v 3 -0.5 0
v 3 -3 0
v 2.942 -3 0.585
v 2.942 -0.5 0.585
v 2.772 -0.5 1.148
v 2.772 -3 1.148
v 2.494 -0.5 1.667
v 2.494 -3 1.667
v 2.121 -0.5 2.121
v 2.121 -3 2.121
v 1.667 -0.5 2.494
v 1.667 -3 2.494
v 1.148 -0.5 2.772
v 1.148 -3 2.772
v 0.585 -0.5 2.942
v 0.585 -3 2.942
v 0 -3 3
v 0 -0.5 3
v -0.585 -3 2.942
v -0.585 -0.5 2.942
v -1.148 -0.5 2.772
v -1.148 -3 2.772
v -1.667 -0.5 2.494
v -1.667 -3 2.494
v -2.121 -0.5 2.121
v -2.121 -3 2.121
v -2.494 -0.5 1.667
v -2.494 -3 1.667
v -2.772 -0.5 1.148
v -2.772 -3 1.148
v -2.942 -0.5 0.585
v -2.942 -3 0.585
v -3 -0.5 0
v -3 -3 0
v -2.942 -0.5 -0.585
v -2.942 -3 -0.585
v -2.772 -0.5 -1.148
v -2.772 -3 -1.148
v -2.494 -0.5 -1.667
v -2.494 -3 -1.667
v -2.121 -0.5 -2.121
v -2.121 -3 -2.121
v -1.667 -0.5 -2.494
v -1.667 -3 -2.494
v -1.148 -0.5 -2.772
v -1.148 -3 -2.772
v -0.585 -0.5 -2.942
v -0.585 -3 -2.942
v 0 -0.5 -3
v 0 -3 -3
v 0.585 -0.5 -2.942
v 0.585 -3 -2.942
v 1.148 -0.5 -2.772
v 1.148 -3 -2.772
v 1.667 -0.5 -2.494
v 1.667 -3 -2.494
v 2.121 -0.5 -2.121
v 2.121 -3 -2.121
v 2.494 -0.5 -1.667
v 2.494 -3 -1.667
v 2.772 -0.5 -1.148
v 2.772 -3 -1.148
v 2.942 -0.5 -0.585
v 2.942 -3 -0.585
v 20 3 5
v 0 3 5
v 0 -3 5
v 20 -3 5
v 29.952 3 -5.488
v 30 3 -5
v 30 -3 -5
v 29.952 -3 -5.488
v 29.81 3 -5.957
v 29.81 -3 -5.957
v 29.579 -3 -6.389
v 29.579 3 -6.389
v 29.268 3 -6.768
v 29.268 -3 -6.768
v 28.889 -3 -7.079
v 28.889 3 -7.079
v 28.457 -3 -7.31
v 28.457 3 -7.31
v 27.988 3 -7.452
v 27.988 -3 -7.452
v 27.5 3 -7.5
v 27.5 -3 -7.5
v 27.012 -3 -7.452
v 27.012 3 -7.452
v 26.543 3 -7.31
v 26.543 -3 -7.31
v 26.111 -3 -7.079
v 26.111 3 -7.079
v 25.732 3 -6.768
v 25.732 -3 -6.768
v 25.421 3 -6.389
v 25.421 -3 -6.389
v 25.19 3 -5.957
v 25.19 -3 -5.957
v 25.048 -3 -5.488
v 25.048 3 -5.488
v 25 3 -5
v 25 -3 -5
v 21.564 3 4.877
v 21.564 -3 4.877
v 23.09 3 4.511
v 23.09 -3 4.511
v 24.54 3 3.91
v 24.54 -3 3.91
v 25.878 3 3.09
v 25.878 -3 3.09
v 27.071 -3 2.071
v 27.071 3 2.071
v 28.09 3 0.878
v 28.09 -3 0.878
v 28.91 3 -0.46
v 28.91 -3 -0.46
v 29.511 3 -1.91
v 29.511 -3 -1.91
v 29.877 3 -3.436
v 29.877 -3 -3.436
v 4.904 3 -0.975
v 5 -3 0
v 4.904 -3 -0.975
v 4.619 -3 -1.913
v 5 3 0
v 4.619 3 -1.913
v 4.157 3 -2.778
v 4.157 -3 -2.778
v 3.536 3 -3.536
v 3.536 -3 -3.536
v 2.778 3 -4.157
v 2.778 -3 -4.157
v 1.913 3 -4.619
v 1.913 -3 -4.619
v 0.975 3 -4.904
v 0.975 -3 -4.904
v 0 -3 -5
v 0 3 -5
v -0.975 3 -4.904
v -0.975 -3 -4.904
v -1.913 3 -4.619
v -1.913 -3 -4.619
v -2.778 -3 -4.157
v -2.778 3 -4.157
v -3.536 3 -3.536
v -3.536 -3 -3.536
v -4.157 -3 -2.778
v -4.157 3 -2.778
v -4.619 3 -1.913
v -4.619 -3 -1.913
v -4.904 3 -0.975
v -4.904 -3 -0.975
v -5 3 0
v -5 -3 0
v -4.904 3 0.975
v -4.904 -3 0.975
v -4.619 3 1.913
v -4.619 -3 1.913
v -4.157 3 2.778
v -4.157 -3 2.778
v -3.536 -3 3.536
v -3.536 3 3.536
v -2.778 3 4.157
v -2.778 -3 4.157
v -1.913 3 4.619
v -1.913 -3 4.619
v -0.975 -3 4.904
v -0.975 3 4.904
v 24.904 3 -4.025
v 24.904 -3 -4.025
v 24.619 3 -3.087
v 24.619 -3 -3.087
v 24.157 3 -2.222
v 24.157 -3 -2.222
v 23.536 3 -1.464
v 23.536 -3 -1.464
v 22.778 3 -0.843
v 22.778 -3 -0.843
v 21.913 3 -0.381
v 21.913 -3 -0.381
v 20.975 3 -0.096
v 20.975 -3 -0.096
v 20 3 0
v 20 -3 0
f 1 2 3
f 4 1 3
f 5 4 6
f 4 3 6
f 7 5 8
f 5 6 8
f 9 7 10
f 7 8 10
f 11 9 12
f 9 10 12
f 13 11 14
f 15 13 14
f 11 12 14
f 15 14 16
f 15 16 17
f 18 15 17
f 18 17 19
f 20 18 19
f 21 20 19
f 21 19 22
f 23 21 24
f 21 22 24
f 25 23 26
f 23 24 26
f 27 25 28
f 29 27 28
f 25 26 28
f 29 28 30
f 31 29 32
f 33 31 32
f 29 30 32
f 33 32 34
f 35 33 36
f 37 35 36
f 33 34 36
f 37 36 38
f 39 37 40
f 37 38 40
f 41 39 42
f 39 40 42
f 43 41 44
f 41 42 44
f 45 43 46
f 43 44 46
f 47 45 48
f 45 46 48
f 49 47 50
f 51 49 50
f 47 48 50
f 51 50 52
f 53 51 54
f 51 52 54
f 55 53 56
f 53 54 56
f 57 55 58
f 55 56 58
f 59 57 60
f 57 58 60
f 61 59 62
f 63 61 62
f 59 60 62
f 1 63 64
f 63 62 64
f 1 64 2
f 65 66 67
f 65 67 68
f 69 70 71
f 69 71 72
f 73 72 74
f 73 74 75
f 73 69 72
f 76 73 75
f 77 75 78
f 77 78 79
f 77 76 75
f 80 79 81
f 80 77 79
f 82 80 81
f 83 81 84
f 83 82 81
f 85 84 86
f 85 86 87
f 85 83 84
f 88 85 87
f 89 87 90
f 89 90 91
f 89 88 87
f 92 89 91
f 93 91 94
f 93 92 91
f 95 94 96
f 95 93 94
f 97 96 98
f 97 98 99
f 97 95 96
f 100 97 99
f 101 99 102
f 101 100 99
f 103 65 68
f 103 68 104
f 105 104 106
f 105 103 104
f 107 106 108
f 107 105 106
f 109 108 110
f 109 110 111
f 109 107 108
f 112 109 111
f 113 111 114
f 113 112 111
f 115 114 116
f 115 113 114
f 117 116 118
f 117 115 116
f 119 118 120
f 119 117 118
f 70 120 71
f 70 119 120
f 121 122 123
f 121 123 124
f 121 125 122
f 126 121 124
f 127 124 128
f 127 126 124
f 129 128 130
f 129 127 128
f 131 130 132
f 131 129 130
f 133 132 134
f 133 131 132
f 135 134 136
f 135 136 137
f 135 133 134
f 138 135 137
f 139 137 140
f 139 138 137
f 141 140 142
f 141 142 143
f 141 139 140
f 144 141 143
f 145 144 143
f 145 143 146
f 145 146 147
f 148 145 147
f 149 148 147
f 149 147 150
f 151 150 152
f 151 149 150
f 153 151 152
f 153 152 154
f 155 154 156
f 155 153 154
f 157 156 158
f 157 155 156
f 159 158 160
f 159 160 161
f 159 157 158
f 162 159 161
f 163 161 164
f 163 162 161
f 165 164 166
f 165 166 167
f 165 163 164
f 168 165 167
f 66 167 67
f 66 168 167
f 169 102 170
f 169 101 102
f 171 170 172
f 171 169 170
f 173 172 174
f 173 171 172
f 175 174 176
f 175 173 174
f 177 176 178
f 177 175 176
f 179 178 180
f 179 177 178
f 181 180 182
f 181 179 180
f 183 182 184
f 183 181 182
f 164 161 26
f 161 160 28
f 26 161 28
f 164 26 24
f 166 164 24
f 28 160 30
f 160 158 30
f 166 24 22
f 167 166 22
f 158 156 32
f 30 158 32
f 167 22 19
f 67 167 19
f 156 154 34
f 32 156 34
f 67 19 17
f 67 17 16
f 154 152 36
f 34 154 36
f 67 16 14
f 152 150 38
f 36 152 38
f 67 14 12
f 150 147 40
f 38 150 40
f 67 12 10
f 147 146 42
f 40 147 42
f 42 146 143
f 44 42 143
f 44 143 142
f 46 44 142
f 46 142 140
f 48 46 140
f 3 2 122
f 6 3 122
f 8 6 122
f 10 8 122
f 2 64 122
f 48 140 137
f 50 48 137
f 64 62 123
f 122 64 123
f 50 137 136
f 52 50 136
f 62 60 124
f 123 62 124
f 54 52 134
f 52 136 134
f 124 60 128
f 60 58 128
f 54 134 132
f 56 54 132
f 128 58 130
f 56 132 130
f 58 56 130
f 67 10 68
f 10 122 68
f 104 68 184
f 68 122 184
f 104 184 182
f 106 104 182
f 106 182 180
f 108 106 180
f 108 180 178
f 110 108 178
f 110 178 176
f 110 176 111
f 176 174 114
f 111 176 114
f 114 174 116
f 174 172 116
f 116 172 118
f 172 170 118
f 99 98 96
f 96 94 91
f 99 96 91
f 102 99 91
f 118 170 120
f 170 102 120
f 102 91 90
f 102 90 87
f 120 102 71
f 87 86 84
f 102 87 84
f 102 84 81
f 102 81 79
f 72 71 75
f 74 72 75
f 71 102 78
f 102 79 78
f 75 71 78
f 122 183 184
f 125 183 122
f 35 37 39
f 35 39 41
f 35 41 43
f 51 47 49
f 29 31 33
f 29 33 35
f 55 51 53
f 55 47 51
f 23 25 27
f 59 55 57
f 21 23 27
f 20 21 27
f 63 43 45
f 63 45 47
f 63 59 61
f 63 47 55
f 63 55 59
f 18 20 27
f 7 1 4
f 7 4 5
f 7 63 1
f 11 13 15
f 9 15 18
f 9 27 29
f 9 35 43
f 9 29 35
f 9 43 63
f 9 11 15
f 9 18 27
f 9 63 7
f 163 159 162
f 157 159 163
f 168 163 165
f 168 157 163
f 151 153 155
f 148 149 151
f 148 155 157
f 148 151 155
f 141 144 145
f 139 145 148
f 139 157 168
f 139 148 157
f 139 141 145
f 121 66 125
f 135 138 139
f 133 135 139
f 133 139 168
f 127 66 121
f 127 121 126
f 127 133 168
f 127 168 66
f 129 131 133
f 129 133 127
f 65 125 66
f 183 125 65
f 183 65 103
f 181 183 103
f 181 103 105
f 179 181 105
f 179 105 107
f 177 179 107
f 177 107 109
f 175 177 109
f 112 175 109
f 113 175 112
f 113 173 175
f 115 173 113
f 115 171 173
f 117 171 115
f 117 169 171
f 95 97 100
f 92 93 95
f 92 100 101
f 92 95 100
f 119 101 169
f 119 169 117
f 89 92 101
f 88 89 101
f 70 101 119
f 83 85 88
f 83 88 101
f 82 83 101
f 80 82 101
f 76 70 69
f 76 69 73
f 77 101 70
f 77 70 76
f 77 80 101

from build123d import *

# Parameters (mm, degrees)
BOSS_EXTRUDE2_DEPTH = 3
SKETCH4_R           = 3
CUT_EXTRUDE2_DEPTH  = 2.5


with BuildPart() as part:
    # Sketch1 → Boss-Extrude2 (new body, symmetric)
    with BuildSketch(Plane(origin=(0, 0, 0), x_dir=(1, 0, 0), z_dir=(0, 1, 0))):
        with BuildLine():
            ThreePointArc((5, 0), (-3.535533906, 3.535533906), (0, -5))
            Line((0, -5), (20, -5))
            ThreePointArc((20, -5), (27.071067812, -2.071067812), (30, 5))
            ThreePointArc((30, 5), (27.5, 7.5), (25, 5))
            ThreePointArc((25, 5), (23.535533906, 1.464466094), (20, 0))
            Line((20, 0), (5, 0))
        make_face()
    extrude(amount=BOSS_EXTRUDE2_DEPTH, both=True)

    # Sketch4 → Cut-Extrude2 (cut)
    with BuildSketch(Plane.XZ.offset(3)):
        Circle(SKETCH4_R)
    extrude(amount=-CUT_EXTRUDE2_DEPTH, mode=Mode.SUBTRACT)


solid = part.part
